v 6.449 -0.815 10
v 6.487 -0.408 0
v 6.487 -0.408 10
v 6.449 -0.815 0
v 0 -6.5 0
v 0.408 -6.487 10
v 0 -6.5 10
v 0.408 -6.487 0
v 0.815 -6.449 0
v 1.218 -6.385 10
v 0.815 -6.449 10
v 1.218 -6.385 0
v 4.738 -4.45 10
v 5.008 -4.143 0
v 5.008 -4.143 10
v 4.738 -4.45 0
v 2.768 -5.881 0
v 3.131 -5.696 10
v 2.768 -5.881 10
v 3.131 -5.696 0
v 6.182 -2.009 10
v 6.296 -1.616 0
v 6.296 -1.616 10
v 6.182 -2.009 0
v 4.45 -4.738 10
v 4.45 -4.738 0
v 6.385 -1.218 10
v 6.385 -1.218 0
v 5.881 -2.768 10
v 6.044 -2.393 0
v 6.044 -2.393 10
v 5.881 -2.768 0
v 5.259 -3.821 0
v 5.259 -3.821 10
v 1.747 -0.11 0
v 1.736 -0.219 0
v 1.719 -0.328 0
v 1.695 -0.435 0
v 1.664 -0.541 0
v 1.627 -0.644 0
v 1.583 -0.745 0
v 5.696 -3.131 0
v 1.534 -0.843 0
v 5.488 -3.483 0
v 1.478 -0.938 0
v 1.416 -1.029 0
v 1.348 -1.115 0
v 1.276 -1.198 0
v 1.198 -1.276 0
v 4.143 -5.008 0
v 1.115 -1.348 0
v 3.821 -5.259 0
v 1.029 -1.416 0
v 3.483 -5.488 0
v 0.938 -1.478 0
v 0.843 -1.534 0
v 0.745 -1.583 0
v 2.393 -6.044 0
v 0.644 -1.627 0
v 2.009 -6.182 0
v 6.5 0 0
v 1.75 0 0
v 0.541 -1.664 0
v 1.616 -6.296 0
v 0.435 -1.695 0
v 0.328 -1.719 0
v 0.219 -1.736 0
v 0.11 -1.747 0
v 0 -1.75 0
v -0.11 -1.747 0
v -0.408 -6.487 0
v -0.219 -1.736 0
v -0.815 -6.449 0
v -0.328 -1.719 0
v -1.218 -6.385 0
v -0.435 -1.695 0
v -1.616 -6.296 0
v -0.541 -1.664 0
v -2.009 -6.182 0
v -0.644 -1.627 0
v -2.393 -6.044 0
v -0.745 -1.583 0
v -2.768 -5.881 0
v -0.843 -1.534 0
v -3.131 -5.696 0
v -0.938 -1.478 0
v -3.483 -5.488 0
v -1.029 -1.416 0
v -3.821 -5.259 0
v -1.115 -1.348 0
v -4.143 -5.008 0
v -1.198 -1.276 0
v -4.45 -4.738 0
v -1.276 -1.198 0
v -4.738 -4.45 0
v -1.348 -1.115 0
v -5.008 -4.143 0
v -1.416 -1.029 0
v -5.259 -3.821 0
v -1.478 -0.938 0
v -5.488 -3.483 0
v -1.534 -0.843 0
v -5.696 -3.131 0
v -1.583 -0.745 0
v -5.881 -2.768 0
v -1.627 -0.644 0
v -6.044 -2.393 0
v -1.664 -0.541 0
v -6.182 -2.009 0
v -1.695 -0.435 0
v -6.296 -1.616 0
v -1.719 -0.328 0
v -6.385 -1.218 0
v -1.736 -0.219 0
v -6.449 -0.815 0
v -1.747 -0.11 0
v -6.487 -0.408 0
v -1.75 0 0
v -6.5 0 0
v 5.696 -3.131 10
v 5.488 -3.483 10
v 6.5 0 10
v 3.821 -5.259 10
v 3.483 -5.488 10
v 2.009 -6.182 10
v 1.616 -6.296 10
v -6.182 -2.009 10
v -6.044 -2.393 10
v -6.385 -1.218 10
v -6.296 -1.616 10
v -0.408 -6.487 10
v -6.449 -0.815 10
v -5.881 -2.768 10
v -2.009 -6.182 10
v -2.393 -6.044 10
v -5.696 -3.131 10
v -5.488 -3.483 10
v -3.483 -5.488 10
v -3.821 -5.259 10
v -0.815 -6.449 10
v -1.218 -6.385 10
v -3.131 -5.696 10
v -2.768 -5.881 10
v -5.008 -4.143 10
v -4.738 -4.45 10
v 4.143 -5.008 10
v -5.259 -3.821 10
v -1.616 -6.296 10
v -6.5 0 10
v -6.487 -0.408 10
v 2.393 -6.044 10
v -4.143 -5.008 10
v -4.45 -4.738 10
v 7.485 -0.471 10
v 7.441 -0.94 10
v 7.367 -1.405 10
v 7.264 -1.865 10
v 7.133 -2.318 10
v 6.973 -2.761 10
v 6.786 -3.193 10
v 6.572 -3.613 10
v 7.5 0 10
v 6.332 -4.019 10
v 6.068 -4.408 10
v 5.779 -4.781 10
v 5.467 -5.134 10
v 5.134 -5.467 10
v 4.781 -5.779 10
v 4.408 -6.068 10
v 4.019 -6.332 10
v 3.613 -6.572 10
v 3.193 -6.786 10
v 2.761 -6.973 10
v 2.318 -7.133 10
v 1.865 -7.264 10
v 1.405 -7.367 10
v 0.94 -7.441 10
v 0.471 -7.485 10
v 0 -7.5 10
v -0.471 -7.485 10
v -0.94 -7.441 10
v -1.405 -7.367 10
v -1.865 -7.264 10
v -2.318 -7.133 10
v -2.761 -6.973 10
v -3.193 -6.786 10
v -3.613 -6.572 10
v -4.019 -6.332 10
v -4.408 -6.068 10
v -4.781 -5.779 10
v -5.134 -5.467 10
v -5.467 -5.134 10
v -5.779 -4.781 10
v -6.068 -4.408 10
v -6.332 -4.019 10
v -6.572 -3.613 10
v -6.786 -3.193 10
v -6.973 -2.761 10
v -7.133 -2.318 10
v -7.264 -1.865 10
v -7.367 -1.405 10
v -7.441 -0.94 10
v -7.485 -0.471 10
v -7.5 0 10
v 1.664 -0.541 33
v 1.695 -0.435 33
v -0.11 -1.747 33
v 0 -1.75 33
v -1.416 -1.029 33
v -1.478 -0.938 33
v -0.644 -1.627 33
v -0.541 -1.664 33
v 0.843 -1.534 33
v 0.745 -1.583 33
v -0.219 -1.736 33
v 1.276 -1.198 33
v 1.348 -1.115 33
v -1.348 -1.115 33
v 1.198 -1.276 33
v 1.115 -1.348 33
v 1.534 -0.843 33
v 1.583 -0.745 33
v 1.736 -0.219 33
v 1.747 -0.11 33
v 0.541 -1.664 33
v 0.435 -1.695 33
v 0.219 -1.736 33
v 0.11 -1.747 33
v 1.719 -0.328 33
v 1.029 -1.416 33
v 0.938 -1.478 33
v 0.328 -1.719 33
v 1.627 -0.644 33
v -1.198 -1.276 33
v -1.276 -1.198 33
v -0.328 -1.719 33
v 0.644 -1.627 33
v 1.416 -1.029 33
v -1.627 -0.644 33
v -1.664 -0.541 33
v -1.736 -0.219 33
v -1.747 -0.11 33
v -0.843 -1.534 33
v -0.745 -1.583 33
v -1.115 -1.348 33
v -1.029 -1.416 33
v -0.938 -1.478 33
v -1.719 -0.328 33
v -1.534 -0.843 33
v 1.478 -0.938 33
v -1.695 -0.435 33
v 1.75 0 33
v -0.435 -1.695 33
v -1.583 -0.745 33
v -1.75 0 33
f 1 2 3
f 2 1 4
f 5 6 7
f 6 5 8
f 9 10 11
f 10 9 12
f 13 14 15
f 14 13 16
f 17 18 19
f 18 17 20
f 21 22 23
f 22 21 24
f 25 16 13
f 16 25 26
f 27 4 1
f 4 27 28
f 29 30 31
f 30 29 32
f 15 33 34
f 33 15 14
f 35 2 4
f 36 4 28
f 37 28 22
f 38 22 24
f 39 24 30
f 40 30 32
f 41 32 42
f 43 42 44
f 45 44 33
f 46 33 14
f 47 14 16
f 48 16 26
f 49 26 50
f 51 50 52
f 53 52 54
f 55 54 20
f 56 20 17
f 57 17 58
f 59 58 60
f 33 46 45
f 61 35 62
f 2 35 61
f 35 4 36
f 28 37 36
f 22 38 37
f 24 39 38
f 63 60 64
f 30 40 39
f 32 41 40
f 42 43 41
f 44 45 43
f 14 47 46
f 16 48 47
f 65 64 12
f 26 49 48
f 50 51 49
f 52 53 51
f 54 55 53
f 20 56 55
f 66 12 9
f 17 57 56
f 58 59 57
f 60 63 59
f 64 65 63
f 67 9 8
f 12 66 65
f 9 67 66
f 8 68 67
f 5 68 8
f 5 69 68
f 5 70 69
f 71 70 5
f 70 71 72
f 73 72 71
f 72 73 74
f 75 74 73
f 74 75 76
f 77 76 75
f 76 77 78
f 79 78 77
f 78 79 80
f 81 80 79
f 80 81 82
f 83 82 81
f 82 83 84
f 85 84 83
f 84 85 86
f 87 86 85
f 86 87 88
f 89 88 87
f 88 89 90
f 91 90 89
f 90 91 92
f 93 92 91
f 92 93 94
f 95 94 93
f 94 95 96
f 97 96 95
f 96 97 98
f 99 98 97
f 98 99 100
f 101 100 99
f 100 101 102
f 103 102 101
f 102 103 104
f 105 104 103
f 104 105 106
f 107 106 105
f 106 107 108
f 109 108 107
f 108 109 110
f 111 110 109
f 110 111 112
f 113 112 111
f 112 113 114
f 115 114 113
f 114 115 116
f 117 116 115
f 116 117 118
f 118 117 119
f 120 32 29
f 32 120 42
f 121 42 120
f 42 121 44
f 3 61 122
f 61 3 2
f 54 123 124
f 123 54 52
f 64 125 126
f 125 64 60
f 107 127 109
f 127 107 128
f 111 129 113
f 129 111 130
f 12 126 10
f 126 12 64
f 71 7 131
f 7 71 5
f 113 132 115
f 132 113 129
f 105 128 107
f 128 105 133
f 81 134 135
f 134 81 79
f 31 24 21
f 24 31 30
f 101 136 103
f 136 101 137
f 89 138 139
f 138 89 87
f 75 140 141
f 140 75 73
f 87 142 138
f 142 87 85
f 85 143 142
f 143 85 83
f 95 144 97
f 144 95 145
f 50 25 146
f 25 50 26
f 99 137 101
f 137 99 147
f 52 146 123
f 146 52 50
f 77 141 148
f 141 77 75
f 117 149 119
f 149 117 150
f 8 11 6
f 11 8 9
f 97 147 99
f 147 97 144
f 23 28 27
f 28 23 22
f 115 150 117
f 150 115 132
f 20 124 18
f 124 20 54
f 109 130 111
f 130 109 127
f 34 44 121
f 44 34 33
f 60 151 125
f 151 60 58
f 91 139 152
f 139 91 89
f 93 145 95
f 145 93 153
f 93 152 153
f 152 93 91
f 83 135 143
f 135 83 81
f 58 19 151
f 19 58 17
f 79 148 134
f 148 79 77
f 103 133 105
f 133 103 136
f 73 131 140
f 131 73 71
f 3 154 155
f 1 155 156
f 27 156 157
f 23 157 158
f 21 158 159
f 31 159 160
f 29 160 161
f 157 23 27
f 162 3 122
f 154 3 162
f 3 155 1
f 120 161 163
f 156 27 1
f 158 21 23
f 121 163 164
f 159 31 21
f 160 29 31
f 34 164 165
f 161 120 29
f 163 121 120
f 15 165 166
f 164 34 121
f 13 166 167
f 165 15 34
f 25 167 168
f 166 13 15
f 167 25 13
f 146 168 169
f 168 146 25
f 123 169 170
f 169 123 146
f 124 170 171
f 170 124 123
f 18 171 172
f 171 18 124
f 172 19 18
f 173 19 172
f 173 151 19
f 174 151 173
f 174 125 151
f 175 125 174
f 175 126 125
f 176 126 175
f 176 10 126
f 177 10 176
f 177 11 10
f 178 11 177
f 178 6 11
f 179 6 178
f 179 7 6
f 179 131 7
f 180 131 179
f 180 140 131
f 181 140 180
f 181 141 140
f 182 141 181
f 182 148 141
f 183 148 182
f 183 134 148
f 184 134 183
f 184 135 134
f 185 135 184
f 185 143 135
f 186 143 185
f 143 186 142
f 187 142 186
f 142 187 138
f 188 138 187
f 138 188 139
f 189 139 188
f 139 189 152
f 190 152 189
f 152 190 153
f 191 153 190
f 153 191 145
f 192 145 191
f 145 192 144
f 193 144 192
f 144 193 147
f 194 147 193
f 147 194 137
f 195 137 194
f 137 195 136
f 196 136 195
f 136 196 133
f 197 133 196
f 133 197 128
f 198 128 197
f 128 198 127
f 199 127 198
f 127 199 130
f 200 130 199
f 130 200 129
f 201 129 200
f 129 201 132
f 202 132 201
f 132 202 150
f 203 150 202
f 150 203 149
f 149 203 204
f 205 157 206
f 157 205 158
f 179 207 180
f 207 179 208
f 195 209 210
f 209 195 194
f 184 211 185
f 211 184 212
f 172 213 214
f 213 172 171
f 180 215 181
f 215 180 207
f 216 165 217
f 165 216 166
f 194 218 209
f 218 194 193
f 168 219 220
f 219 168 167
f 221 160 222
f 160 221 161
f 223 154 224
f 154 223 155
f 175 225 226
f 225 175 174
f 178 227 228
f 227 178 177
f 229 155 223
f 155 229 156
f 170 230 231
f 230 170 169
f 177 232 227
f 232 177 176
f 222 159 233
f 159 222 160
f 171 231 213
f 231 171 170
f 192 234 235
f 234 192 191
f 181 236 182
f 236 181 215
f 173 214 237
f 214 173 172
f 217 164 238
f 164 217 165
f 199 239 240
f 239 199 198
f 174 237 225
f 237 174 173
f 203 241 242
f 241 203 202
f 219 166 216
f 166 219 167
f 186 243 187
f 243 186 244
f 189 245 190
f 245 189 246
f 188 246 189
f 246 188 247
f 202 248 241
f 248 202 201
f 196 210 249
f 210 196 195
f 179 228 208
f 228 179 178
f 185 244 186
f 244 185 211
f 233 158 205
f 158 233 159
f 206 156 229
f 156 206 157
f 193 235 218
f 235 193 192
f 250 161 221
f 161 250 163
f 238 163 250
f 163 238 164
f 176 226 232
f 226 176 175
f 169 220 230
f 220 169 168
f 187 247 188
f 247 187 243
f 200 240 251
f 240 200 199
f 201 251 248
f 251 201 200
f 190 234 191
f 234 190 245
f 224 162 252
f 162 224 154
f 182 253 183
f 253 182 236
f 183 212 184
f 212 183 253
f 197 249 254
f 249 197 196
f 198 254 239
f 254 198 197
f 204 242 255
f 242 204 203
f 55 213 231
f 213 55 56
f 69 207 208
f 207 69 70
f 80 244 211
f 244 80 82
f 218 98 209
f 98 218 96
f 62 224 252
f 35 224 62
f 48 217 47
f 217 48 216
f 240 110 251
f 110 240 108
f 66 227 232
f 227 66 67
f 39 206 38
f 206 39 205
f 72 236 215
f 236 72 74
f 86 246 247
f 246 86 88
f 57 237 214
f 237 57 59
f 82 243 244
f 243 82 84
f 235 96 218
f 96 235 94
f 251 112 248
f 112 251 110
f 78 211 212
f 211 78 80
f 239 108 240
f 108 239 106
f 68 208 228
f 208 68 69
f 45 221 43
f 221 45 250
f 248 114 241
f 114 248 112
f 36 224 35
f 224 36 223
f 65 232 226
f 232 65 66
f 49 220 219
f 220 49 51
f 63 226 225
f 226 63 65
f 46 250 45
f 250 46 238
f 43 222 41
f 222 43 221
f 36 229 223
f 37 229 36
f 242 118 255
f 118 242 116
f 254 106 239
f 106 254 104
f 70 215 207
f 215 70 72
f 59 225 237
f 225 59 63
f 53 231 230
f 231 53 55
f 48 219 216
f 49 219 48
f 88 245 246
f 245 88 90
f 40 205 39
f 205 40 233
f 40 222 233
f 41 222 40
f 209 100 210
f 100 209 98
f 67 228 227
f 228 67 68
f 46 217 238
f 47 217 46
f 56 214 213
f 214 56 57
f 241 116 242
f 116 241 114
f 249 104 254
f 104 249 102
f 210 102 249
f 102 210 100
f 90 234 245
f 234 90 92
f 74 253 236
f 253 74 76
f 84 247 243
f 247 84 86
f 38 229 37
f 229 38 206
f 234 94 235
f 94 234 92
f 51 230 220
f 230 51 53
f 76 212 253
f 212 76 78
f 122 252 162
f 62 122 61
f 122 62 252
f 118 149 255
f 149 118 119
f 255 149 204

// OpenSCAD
$fn = 100;
cut = 100; // arbitrary large dimension

module pipe_cap() {
    difference() {
        union() {
            cylinder(d=13, h=10);
            translate([0, 0 , 10]) cylinder(d1=15, d2=0, h=30);
        }
        cylinder(d=3.5, h=cut, center=true);
    }
}

difference() {
    pipe_cap();
    translate([-cut/2, 0, -1]) cube([cut, cut, cut]);
}
